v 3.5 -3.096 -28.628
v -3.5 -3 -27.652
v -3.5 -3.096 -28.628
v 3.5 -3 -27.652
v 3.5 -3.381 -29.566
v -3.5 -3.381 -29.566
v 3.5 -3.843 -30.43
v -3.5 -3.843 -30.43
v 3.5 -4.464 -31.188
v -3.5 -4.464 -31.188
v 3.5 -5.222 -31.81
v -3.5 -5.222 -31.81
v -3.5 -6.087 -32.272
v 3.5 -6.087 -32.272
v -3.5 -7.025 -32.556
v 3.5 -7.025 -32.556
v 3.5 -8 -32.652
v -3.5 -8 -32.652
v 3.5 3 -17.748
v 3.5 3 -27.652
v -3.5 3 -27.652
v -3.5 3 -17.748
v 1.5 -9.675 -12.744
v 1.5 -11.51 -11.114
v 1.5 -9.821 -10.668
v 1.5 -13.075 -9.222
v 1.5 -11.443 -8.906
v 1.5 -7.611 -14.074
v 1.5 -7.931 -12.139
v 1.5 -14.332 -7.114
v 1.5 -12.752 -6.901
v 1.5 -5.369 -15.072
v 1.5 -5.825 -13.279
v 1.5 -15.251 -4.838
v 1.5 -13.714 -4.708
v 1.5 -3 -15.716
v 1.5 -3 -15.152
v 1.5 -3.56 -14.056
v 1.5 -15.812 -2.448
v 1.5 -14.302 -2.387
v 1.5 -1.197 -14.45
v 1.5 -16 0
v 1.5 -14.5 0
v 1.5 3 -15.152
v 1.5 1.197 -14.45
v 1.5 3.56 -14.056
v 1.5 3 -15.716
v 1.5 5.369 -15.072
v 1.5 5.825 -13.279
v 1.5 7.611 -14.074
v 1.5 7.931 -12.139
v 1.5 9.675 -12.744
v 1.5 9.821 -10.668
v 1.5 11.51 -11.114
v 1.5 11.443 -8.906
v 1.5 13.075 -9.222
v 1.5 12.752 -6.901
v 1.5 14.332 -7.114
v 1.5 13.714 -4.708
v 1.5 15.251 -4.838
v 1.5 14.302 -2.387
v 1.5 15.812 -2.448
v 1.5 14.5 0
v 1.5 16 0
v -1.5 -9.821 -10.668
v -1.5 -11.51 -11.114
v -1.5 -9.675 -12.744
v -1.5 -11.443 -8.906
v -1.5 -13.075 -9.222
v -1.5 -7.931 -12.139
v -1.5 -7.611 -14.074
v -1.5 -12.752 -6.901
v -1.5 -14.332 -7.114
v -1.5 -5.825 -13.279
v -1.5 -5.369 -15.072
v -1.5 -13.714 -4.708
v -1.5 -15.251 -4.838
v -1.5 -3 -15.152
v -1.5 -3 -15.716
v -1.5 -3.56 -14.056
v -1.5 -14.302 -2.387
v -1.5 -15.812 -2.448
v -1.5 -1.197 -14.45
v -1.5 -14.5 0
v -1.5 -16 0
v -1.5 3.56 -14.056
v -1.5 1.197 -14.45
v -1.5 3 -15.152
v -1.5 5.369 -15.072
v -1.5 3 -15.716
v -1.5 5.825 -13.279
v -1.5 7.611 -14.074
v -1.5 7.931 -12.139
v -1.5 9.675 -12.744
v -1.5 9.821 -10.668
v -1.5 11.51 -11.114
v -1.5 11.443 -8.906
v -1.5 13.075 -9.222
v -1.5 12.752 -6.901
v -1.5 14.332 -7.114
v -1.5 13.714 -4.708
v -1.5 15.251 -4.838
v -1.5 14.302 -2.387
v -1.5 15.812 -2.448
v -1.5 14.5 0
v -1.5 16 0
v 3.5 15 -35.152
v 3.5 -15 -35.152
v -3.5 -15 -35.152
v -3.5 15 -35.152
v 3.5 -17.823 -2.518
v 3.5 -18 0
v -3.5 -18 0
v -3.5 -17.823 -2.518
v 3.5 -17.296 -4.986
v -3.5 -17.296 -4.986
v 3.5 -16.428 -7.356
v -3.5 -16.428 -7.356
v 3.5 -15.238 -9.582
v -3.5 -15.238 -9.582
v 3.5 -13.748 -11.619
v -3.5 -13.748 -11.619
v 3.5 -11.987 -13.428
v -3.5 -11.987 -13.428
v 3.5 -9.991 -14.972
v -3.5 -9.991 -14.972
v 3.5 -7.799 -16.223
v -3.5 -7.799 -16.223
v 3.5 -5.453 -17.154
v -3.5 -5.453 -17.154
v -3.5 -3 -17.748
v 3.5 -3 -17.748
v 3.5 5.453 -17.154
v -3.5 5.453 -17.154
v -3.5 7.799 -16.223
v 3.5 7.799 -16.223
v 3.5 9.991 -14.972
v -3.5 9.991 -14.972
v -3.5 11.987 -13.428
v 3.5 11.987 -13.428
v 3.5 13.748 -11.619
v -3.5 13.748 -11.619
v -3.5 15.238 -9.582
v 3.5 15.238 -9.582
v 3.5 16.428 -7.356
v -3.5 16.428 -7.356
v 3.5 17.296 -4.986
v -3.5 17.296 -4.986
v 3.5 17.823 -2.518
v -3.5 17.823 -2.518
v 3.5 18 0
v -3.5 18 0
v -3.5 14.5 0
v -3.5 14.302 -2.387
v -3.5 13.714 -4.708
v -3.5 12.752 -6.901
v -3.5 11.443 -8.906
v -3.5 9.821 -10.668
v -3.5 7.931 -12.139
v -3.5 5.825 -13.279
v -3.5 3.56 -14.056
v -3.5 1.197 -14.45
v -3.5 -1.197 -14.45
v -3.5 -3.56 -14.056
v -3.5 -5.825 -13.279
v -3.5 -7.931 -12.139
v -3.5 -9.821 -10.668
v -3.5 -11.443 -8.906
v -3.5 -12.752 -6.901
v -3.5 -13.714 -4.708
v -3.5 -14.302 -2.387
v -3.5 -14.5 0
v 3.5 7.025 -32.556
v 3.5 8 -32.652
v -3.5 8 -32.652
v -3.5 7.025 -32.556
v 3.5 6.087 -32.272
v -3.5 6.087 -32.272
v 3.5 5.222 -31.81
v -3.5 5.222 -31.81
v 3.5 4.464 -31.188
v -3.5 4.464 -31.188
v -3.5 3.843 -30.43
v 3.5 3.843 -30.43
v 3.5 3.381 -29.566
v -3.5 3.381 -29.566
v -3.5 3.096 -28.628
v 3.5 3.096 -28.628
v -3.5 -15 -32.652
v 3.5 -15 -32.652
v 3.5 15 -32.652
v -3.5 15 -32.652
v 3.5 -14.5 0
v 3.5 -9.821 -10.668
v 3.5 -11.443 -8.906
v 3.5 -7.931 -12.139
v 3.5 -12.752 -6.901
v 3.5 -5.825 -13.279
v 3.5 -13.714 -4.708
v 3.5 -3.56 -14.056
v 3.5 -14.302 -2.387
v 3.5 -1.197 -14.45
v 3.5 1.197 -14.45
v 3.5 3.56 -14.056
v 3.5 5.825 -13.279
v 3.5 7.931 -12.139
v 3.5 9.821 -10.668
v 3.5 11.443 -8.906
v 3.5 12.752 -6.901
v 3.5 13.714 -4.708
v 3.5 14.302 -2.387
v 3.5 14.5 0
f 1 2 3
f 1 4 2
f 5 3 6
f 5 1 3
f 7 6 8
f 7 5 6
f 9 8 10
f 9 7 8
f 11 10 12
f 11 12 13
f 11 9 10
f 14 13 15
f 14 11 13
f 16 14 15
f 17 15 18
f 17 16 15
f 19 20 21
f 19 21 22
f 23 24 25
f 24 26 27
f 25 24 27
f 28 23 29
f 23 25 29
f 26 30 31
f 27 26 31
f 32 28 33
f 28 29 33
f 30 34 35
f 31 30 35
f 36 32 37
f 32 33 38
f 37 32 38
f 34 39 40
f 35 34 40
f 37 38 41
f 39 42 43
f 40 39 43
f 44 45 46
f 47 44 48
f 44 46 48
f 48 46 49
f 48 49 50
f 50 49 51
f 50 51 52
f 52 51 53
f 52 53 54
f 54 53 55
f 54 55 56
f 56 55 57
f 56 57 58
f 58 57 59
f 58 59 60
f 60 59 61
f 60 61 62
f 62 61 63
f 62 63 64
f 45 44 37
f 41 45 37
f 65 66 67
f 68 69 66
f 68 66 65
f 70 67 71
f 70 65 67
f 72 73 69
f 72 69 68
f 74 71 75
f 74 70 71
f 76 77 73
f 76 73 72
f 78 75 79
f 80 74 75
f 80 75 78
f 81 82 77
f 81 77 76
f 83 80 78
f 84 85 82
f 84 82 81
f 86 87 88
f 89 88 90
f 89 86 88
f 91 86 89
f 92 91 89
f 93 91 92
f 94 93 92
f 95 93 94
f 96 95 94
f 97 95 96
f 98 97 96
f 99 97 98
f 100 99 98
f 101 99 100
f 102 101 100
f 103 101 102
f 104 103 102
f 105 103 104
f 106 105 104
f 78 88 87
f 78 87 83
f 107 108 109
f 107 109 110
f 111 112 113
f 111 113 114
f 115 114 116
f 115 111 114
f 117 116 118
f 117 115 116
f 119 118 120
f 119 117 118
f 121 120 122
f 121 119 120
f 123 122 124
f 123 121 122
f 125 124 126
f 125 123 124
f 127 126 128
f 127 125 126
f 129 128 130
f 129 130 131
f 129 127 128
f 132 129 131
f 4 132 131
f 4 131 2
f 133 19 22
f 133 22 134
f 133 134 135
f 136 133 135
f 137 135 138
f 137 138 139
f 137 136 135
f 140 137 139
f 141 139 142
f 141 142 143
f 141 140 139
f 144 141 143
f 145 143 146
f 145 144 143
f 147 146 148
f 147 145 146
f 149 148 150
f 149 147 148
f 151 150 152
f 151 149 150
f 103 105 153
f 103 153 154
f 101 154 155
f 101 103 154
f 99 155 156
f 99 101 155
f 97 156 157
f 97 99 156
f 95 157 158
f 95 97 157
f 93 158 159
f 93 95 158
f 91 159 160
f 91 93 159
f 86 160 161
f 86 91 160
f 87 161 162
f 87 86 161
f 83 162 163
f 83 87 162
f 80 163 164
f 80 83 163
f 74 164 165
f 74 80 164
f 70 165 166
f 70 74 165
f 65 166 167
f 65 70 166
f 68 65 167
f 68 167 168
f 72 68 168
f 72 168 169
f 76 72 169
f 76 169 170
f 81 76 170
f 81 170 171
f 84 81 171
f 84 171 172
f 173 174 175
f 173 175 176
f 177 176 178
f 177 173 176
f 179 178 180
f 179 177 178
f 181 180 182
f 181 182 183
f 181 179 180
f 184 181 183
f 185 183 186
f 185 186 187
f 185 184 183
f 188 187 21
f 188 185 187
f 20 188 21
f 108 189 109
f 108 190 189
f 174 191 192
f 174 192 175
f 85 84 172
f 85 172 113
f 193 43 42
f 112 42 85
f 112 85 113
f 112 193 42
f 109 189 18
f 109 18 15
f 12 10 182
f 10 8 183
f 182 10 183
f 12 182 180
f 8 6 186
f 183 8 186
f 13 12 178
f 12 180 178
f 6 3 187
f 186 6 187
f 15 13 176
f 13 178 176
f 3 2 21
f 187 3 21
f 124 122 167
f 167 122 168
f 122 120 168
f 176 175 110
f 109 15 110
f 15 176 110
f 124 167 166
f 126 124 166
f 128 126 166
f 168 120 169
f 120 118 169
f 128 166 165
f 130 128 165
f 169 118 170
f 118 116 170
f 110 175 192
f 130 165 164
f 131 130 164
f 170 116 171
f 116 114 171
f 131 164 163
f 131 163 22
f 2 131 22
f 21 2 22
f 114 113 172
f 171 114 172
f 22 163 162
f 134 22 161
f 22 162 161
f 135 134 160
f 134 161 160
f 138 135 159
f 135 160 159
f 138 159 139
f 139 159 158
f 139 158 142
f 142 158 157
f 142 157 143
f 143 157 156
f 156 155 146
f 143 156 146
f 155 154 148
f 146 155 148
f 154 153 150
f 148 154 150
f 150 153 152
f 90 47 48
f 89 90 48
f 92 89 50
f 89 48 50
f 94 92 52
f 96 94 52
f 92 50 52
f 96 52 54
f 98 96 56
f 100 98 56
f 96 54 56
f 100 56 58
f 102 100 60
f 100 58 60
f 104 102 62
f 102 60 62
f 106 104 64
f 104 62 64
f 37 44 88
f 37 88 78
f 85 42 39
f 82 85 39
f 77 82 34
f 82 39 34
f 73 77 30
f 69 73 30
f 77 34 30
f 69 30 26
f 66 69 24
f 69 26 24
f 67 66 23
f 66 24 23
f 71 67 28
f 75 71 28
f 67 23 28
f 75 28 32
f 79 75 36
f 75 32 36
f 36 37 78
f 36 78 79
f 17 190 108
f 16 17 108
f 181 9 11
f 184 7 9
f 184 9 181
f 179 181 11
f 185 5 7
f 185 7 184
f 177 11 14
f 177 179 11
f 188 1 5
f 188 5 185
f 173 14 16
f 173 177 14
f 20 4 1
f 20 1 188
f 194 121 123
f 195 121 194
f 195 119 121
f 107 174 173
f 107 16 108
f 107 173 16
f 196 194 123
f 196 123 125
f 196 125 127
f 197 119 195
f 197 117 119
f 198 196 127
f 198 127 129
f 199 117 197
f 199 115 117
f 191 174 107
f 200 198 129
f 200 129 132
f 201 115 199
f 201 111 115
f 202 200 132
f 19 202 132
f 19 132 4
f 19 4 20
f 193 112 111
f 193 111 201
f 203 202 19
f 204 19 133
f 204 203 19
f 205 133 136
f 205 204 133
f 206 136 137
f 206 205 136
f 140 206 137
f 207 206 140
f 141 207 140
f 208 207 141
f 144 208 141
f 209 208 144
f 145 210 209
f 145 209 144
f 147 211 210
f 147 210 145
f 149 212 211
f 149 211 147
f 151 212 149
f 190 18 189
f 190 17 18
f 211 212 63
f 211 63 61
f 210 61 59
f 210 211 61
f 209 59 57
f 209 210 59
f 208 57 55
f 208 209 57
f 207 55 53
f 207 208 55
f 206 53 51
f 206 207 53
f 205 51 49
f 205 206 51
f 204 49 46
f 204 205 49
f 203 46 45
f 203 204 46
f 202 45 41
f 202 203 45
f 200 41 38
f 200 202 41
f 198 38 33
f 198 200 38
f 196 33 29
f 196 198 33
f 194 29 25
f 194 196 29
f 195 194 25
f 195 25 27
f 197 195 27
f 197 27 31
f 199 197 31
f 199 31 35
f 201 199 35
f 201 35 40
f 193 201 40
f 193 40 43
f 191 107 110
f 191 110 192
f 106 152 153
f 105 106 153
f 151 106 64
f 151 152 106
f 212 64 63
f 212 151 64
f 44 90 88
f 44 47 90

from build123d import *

# Parameters (mm, degrees)
F1_DEPTH = 3.5
F2_DEPTH = 1.5
F4_DEPTH = 3.5


with BuildPart() as f1:
    # F0 (on Right) → F1 (new body, symmetric)
    with BuildSketch(Plane.YZ):
        with BuildLine():
            ThreePointArc((-16, 0), (0, -16), (16, 0))
            Line((16, 0), (14.5, 0))
            ThreePointArc((14.5, 0), (0, -14.5), (-14.5, 0))
            Line((-14.5, 0), (-16, 0))
        make_face()
        with BuildLine():
            Line((18, 0), (16, 0))
            ThreePointArc((16, 0), (0, -16), (-16, 0))
            Line((-16, 0), (-18, 0))
            ThreePointArc((-18, 0), (0, -18), (18, 0))
        make_face()
    extrude(amount=F1_DEPTH, both=True)

    # F0 (on Right) → F2 (cut, symmetric)
    with BuildSketch(Plane.YZ):
        with BuildLine():
            ThreePointArc((-16, 0), (0, -16), (16, 0))
            Line((16, 0), (14.5, 0))
            ThreePointArc((14.5, 0), (0, -14.5), (-14.5, 0))
            Line((-14.5, 0), (-16, 0))
        make_face()
    extrude(amount=F2_DEPTH, both=True, mode=Mode.SUBTRACT)

    # F3 (on Right) → F4 (join, symmetric)
    with BuildSketch(Plane.YZ):
        Polygon((8, -32.6522623003), (-8, -32.6522623003), (-10, -32.6522623003), (-15, -32.6522623003), (-15, -35.1522623003), (-3, -35.1522623003), (3, -35.1522623003), (15, -35.1522623003), (15, -32.6522623003), (10, -32.6522623003), align=None)
        with BuildLine():
            Line((3, -15.1522623003), (-3, -15.1522623003))
            Line((-3, -15.1522623003), (-3, -27.6522623003))
            ThreePointArc((-3, -27.6522623003), (-4.4644660941, -31.1877962062), (-8, -32.6522623003))
            Line((-8, -32.6522623003), (8, -32.6522623003))
            ThreePointArc((8, -32.6522623003), (4.4644660941, -31.1877962062), (3, -27.6522623003))
            Line((3, -27.6522623003), (3, -15.1522623003))
        make_face()
    extrude(amount=F4_DEPTH, both=True)


solid = f1.part
